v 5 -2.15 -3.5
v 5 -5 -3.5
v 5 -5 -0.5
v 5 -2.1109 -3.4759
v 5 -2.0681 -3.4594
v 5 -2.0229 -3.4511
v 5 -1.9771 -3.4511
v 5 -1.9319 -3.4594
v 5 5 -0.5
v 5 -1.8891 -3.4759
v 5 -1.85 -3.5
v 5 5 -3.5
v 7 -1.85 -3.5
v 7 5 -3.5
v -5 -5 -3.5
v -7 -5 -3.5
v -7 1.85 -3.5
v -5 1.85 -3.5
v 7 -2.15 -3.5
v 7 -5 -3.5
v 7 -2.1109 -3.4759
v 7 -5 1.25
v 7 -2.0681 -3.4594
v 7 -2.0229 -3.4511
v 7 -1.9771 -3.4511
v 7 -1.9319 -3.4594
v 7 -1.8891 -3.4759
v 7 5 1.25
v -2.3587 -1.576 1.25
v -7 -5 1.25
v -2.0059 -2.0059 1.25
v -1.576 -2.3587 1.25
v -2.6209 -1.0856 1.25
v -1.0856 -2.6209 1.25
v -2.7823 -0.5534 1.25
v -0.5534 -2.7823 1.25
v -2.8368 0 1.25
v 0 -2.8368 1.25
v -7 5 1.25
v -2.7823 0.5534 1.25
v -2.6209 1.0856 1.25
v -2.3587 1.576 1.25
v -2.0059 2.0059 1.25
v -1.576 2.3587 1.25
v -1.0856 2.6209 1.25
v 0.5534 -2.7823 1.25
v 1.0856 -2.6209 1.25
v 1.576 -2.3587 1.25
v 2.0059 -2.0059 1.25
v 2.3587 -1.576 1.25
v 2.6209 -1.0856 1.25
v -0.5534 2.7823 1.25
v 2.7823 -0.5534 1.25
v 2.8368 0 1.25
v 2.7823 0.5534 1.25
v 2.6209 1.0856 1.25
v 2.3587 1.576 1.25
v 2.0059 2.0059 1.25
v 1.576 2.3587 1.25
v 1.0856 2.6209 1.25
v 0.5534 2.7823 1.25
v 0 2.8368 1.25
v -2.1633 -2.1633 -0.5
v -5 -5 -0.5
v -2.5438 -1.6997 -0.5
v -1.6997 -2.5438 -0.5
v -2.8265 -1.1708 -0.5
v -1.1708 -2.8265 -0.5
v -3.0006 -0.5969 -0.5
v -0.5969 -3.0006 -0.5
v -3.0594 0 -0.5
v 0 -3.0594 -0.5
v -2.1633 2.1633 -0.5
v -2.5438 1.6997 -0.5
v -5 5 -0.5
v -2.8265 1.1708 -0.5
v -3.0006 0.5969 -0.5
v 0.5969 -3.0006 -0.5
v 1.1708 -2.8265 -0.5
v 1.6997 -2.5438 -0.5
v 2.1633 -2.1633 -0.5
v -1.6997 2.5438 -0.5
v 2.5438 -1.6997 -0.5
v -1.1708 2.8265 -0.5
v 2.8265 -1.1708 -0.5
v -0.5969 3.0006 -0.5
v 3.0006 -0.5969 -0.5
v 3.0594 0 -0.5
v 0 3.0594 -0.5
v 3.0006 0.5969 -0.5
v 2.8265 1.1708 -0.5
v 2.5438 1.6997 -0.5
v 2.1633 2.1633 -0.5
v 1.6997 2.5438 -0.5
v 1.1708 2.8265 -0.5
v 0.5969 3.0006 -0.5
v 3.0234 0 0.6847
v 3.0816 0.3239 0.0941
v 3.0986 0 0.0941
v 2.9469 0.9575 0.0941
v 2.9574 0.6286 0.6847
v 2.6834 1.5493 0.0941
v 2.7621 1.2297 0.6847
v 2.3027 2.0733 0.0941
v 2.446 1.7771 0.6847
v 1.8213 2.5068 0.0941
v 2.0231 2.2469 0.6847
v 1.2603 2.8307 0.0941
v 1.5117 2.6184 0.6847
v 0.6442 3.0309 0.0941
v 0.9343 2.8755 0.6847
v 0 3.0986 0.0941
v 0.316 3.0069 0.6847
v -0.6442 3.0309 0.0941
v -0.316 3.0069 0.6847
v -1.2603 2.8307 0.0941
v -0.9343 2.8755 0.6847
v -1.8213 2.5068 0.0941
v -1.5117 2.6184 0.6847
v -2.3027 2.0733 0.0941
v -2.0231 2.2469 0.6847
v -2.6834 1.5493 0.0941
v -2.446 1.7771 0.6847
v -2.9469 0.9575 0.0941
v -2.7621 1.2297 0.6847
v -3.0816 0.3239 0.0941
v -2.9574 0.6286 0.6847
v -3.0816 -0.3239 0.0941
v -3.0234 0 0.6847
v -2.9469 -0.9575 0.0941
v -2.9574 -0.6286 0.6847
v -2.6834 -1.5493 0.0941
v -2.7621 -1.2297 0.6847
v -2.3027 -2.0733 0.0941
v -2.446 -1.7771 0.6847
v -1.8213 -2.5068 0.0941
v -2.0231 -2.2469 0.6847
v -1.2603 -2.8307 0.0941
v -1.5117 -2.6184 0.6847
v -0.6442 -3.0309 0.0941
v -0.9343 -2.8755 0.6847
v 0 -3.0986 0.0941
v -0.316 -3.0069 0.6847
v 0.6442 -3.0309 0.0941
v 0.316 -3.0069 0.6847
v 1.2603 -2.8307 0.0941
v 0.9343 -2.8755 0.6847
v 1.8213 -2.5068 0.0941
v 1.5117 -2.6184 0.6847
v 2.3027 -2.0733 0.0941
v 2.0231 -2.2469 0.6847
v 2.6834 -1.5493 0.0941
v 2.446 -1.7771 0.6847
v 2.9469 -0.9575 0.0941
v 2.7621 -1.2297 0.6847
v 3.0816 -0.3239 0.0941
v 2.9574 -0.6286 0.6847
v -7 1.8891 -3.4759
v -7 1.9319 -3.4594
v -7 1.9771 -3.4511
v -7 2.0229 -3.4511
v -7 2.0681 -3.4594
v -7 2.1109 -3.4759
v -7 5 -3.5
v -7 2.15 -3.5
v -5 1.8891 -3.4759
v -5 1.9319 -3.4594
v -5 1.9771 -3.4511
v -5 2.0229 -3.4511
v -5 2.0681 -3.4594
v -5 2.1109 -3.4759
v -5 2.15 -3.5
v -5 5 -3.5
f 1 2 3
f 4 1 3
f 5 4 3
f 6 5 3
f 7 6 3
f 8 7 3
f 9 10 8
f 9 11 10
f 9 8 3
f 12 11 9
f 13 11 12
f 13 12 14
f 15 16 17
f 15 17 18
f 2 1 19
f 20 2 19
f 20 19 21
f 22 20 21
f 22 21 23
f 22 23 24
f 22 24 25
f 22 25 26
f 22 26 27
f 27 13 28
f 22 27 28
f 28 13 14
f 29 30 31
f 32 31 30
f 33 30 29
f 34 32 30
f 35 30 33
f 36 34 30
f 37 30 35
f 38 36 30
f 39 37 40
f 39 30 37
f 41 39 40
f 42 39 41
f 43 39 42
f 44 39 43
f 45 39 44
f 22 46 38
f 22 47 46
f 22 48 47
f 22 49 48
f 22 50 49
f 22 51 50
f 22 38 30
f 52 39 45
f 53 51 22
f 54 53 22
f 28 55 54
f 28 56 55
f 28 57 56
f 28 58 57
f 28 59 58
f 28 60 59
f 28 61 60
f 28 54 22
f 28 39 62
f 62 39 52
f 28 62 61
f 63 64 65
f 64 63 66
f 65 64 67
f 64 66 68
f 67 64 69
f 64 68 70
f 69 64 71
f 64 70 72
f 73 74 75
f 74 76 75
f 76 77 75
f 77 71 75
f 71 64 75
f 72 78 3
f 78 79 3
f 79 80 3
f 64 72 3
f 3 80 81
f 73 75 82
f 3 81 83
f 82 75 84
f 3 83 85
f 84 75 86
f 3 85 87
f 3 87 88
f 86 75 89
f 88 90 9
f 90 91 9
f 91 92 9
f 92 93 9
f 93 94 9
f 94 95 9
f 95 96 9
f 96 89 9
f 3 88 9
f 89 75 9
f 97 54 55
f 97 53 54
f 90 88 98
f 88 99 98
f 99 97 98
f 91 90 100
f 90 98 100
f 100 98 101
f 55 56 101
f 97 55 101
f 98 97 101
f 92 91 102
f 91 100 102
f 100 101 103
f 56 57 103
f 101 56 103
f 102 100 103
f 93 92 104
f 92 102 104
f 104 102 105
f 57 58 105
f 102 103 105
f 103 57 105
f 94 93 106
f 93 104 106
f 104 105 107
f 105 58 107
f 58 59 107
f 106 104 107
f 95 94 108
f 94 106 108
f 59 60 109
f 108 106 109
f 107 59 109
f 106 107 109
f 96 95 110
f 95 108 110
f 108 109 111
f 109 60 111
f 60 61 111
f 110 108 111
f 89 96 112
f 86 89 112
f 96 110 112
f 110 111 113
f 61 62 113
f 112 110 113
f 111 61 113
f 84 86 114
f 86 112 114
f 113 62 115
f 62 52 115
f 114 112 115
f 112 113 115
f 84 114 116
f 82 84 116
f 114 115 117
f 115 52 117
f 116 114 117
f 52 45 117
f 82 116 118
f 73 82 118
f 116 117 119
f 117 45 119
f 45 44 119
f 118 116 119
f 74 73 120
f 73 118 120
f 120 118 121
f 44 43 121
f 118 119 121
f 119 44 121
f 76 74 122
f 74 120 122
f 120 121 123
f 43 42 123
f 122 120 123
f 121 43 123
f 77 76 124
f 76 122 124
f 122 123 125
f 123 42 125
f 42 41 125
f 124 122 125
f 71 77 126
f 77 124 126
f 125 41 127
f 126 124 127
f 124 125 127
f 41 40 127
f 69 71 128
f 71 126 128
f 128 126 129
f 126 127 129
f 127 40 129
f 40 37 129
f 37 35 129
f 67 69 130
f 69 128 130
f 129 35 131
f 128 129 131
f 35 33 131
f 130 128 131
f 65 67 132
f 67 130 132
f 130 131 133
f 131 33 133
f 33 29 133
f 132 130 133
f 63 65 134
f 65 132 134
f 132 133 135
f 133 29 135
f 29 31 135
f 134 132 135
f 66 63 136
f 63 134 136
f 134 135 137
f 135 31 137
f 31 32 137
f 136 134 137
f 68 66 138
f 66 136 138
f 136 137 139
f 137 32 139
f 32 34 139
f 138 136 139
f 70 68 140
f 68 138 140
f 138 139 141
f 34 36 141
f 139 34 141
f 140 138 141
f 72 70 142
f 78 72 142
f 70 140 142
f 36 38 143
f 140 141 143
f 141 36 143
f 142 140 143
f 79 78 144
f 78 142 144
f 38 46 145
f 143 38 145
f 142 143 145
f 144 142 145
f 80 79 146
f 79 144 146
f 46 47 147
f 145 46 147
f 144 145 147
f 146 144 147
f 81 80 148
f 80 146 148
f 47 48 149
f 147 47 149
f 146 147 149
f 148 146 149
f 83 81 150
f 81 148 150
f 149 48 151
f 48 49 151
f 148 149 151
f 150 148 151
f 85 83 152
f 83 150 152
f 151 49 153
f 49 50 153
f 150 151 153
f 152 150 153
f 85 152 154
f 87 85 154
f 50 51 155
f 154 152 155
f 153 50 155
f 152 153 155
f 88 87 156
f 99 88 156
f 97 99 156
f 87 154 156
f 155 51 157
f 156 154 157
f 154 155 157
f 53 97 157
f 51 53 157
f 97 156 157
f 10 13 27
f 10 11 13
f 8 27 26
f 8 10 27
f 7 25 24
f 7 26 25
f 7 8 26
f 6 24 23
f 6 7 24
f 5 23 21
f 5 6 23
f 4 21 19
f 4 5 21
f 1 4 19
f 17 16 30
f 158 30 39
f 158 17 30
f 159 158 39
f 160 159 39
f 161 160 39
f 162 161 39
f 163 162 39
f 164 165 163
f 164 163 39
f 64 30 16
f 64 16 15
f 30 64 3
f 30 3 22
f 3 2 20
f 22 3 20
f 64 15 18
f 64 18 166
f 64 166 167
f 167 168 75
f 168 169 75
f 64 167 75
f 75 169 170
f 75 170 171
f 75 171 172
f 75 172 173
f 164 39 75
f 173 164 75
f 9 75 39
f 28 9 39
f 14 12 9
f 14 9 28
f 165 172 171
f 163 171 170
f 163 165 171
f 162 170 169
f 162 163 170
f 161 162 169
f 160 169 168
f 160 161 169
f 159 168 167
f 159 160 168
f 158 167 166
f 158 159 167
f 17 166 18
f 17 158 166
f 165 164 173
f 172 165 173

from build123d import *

# Parameters (mm, degrees)
BOX006_W                = 21
BOX006_H                = 17
BOX006_DEPTH            = 12
CYLINDER005_R           = 2.5
CYLINDER005_DEPTH       = 10
CYLINDER004_R           = 0.25
CYLINDER004_DEPTH       = 10
CYLINDER004_PITCH_ANGLE = 90
CYLINDER003_R           = 0.25
CYLINDER003_DEPTH       = 10
CYLINDER003_PITCH_ANGLE = 90
BOX002_W                = 6.5
BOX002_H                = 4.8
BOX002_DEPTH            = 1
BOX003_W                = 10
BOX003_H                = 12
BOX003_DEPTH            = 3
BOX001_W                = 14
BOX001_H                = 10
BOX001_DEPTH            = 7.25


with BuildPart() as cube006:
    # Box006 → Box006 (new body)
    with BuildSketch(Plane(origin=(-9, -7, -3.5), x_dir=(1, 0, 0), z_dir=(0, 0, 1))):
        with Locations((10.5, 8.5)):
            Rectangle(BOX006_W, BOX006_H)
    extrude(amount=BOX006_DEPTH)


with BuildPart() as cylinder005:
    # Cylinder005 → Cylinder005 (new body)
    with BuildSketch(Plane.XY.offset(0.5)):
        Circle(CYLINDER005_R)
    extrude(amount=CYLINDER005_DEPTH)


with BuildPart() as fusion004:
    # Sphere001 → Sphere001 (revolve)
    with BuildSketch(Plane.XZ):
        with BuildLine():
            ThreePointArc((0, -3.1), (3.1, 0), (0, 3.1))
            Line((0, 3.1), (0, -3.1))
        make_face()
    revolve(axis=Axis((0, 0, 0), (0, 0, 1)))

    # Fusion004: union Cylinder005
    add(cylinder005.part)


with BuildPart() as cylinder004:
    # Cylinder004 → Cylinder004 (new body)
    with BuildSketch(Plane.XY):
        Circle(CYLINDER004_R)
    extrude(amount=CYLINDER004_DEPTH)


with BuildPart() as cylinder004_1:
    # Cylinder004 pitch: moved
    add(cylinder004.part.rotate(Axis((0, 0, 0), (0, 1, 0)), CYLINDER004_PITCH_ANGLE))


with BuildPart() as cylinder004_2:
    # Cylinder004 placement: moved
    add(cylinder004_1.part.moved(Location((0, -2, -3.7))))


with BuildPart() as fusion:
    # Cylinder003 → Cylinder003 (new body)
    with BuildSketch(Plane.XY):
        Circle(CYLINDER003_R)
    extrude(amount=CYLINDER003_DEPTH)


with BuildPart() as fusion_1:
    # Cylinder003 pitch: moved
    add(fusion.part.rotate(Axis((0, 0, 0), (0, 1, 0)), CYLINDER003_PITCH_ANGLE))


with BuildPart() as fusion_2:
    # Cylinder003 placement: moved
    add(fusion_1.part.moved(Location((-11, 2, -3.7))))

    # Fusion: union Cylinder004
    add(cylinder004_2.part)


with BuildPart() as fusion001:
    # Box002 → Box002 (new body)
    with BuildSketch(Plane(origin=(-3.25, -2.4, -4.2), x_dir=(1, 0, 0), z_dir=(0, 0, 1))):
        with Locations((3.25, 2.4)):
            Rectangle(BOX002_W, BOX002_H)
    extrude(amount=BOX002_DEPTH)

    # Fusion001: union Fusion
    add(fusion_2.part)


with BuildPart() as cube003:
    # Box003 → Box003 (new body)
    with BuildSketch(Plane(origin=(-5, -6, -3.5), x_dir=(1, 0, 0), z_dir=(0, 0, 1))):
        with Locations((5, 6)):
            Rectangle(BOX003_W, BOX003_H)
    extrude(amount=BOX003_DEPTH)


with BuildPart() as ball_and_screw_holder:
    # Box001 → Box001 (new body)
    with BuildSketch(Plane(origin=(-7, -5, -6), x_dir=(1, 0, 0), z_dir=(0, 0, 1))):
        with Locations((7, 5)):
            Rectangle(BOX001_W, BOX001_H)
    extrude(amount=BOX001_DEPTH)

    # Cut: cut Cube003
    add(cube003.part, mode=Mode.SUBTRACT)

    # Cut001: cut Fusion001
    add(fusion001.part, mode=Mode.SUBTRACT)

    # Cut002: cut Fusion004
    add(fusion004.part, mode=Mode.SUBTRACT)

    # Common: intersect Cube006
    add(cube006.part, mode=Mode.INTERSECT)


solid = ball_and_screw_holder.part
